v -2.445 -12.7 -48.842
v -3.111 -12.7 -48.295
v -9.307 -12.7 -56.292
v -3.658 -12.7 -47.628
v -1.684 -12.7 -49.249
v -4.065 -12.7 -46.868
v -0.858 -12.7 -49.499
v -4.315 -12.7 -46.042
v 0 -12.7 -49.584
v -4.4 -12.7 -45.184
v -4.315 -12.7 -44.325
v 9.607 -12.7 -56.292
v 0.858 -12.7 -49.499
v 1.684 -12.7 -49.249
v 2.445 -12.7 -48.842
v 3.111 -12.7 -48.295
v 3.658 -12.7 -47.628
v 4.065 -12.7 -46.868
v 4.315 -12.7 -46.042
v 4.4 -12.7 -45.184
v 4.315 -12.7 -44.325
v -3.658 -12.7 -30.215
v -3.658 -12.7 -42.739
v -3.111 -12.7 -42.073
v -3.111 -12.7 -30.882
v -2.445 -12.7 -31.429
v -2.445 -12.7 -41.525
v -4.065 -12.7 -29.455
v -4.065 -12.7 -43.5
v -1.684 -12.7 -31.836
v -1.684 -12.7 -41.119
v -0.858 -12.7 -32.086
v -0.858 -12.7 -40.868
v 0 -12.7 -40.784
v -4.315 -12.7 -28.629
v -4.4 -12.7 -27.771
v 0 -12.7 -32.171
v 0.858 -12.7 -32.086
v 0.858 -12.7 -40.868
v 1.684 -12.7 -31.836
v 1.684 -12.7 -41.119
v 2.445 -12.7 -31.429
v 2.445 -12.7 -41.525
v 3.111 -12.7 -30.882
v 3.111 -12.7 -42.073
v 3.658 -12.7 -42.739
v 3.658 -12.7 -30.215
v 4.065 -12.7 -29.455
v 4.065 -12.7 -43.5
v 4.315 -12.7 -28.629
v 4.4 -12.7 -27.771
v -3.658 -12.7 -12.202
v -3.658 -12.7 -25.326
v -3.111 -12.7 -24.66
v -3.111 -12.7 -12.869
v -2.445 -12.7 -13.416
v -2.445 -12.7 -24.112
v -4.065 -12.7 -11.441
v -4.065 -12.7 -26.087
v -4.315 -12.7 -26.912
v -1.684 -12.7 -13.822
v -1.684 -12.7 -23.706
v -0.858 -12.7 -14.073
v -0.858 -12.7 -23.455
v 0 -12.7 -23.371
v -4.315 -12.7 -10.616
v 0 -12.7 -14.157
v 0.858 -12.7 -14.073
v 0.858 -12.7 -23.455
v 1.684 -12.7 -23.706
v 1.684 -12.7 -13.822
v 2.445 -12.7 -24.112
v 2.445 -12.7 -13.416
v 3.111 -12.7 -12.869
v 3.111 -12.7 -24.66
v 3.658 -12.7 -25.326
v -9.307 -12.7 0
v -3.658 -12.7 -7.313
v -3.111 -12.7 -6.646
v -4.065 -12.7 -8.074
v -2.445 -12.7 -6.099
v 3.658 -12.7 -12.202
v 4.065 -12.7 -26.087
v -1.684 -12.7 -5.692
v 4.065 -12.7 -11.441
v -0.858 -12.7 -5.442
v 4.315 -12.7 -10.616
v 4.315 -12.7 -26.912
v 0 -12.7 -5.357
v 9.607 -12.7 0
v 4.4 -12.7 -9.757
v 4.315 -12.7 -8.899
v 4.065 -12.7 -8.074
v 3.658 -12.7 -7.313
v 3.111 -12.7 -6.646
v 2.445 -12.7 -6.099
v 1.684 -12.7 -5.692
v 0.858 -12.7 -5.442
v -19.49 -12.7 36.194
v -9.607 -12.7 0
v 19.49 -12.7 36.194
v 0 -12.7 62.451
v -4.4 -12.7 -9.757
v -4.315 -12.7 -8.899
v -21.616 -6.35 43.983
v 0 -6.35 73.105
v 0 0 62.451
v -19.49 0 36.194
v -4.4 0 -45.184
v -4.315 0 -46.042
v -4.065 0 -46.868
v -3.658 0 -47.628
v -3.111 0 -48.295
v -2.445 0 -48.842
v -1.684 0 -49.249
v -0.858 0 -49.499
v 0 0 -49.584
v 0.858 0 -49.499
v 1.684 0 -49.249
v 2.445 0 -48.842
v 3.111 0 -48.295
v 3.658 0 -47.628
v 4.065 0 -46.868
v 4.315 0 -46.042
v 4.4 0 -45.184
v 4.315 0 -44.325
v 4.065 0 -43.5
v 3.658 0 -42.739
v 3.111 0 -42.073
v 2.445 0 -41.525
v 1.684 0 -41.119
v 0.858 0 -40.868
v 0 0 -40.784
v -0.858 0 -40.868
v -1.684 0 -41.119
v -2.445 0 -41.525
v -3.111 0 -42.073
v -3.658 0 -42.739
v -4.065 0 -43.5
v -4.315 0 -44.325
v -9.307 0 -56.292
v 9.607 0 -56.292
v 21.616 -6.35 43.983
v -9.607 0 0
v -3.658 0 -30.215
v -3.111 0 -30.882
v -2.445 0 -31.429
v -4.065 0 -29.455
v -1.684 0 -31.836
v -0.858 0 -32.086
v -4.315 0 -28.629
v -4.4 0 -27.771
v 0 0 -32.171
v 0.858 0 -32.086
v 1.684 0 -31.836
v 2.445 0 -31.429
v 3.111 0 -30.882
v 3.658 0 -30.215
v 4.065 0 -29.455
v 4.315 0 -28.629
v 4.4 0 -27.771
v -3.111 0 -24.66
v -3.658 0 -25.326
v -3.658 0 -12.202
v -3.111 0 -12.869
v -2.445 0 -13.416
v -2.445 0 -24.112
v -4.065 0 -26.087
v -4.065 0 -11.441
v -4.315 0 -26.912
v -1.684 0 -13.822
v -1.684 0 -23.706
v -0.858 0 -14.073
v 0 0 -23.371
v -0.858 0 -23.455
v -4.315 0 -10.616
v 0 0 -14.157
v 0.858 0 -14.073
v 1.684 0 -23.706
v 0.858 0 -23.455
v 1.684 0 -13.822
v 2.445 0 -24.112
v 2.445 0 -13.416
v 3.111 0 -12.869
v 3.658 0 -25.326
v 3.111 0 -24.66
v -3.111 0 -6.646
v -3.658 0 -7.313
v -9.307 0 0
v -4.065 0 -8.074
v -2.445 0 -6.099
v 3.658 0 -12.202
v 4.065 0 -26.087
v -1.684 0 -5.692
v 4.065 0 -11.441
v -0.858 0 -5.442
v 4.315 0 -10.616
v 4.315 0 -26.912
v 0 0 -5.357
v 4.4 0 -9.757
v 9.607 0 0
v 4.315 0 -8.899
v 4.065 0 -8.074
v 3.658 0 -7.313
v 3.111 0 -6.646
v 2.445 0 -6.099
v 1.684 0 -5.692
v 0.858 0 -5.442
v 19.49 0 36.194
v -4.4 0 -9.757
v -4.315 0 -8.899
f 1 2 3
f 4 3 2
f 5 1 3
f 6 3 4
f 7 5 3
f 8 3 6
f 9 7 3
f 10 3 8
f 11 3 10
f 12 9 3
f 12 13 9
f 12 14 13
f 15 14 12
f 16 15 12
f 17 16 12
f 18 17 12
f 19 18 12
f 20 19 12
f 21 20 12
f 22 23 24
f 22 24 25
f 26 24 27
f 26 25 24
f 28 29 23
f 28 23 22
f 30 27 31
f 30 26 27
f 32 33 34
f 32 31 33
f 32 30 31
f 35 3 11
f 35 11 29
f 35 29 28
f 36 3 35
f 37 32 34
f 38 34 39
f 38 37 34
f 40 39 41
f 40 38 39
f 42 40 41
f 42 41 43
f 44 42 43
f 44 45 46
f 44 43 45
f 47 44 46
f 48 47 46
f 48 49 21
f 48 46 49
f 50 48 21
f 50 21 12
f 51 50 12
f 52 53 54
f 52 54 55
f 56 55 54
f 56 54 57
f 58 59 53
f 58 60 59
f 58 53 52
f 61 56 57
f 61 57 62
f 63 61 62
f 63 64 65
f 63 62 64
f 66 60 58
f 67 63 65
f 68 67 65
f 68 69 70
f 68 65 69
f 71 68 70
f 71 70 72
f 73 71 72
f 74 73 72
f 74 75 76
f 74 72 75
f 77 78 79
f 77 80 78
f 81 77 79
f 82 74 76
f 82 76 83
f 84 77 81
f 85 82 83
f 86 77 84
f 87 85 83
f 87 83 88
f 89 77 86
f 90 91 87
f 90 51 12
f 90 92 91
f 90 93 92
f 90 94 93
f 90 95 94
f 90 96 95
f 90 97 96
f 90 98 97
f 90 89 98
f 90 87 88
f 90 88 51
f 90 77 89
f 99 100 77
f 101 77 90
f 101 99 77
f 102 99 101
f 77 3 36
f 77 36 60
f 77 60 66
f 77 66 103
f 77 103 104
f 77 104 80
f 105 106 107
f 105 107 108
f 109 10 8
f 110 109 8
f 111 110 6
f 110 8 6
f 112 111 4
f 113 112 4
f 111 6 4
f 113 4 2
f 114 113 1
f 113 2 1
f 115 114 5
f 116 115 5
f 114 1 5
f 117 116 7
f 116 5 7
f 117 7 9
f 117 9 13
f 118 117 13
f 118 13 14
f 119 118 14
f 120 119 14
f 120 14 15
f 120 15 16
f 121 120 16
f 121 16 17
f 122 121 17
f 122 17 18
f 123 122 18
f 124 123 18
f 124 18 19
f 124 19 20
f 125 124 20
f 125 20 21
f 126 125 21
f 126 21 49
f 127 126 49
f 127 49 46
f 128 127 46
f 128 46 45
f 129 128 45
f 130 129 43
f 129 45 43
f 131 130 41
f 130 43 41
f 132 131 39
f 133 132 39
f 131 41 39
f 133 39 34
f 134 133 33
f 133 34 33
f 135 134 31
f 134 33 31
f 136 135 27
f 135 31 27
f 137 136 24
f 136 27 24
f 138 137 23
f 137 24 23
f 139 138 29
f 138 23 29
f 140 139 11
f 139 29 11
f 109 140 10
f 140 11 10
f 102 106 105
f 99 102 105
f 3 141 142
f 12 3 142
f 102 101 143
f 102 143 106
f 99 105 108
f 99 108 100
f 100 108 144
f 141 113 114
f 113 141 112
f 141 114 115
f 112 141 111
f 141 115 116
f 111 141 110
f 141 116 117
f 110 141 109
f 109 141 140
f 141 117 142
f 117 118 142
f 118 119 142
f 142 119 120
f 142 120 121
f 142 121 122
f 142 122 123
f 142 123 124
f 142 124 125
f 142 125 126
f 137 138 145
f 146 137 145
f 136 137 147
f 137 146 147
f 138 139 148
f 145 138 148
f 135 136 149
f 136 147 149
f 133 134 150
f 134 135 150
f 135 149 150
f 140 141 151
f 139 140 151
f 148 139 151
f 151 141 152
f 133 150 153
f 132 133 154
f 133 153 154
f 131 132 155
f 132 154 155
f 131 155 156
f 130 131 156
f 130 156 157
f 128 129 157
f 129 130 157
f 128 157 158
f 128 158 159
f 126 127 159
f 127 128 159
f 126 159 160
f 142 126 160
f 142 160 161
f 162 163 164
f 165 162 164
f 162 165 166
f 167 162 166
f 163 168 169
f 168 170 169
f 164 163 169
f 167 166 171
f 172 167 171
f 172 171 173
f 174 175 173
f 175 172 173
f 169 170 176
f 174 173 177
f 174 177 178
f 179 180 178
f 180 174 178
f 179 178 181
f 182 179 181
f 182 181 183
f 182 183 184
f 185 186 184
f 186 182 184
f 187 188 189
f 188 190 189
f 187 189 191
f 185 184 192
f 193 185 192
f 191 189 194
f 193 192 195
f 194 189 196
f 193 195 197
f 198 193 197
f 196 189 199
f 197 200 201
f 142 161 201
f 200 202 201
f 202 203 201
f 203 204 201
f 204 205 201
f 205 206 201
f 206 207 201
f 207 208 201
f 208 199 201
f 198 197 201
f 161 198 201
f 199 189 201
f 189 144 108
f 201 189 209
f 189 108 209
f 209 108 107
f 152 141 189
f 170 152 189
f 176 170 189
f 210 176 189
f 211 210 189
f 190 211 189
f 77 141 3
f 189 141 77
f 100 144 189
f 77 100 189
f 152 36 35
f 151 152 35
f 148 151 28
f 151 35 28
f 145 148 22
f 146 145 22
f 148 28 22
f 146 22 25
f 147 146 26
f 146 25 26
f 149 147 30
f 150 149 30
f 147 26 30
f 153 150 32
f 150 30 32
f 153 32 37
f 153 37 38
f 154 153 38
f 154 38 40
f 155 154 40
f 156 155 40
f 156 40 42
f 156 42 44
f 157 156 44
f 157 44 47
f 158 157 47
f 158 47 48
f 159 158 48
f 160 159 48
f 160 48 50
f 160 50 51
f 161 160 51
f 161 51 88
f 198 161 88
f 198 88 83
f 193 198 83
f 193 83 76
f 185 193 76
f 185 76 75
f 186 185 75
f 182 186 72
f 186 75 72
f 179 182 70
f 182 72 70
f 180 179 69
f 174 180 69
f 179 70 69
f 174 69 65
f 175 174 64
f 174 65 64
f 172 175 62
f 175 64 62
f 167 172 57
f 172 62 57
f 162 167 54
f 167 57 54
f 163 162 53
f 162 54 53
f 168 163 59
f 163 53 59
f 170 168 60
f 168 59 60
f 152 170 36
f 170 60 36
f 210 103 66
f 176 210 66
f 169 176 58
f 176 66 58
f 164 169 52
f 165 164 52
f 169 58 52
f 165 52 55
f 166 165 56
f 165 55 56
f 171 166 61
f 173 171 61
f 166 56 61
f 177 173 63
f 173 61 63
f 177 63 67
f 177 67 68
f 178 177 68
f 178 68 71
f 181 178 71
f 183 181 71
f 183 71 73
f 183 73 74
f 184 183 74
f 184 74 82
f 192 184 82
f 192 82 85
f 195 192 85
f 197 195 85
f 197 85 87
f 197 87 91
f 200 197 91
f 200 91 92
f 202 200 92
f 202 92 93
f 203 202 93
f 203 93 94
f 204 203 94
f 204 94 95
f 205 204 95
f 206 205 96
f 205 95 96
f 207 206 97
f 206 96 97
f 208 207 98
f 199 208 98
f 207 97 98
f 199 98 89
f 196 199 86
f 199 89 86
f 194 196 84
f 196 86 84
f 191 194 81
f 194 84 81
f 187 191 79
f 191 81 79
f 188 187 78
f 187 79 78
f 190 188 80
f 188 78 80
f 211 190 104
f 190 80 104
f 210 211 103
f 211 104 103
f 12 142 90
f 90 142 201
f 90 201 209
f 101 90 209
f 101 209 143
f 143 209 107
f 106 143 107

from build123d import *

# Parameters (mm, degrees)
F0_W     = 18.9141826704
F0_H     = 56.2922134995
F1_DEPTH = 12.7
F3_D     = 8.8
F5_DEPTH = 12.7
F6_SIZE  = 6.34999


# Not quite as in the source:
# - a fillet or chamfer is up to 0.001 mm smaller than in the source, because OpenCascade refuses the exact size


with BuildPart() as f1:
    # F0 (on Front) → F1 (new body)
    with BuildSketch(Plane.XZ):
        with Locations((0.1501129009, -28.1461067498)):
            Rectangle(F0_W, F0_H)
    extrude(amount=F1_DEPTH)

    # F3 (through all)
    with Locations(Plane(origin=(0, 0, 0), x_dir=(1, 0, 0), z_dir=(0, 1, 0))):
        with Locations((0, 9.7573176026), (0, 27.770826593), (0, 45.1838858426)):
            Hole(F3_D / 2)

    # F4 (on Front) → F5 (join)
    with BuildSketch(Plane.XZ):
        Polygon((0, 0), (9.6072051674, 0), (21.6162092984, 43.9829826355), (0, 73.1048211455), (-21.6162092984, 43.9829826355), (-9.6072051674, 0), align=None)
    extrude(amount=F5_DEPTH)

    # F6 (size 6.35 in the source; OpenCascade refuses exactly that, so slightly less here)
    f6_edges = [f1.edges().sort_by_distance(p)[0] for p in [
        (10.808105, 0, 58.543902),
        (-10.808105, 0, 58.543902),
        (10.808105, -12.7, 58.543902),
        (-10.808105, -12.7, 58.543902),
    ]]
    chamfer(f6_edges, length=F6_SIZE)


solid = f1.part
